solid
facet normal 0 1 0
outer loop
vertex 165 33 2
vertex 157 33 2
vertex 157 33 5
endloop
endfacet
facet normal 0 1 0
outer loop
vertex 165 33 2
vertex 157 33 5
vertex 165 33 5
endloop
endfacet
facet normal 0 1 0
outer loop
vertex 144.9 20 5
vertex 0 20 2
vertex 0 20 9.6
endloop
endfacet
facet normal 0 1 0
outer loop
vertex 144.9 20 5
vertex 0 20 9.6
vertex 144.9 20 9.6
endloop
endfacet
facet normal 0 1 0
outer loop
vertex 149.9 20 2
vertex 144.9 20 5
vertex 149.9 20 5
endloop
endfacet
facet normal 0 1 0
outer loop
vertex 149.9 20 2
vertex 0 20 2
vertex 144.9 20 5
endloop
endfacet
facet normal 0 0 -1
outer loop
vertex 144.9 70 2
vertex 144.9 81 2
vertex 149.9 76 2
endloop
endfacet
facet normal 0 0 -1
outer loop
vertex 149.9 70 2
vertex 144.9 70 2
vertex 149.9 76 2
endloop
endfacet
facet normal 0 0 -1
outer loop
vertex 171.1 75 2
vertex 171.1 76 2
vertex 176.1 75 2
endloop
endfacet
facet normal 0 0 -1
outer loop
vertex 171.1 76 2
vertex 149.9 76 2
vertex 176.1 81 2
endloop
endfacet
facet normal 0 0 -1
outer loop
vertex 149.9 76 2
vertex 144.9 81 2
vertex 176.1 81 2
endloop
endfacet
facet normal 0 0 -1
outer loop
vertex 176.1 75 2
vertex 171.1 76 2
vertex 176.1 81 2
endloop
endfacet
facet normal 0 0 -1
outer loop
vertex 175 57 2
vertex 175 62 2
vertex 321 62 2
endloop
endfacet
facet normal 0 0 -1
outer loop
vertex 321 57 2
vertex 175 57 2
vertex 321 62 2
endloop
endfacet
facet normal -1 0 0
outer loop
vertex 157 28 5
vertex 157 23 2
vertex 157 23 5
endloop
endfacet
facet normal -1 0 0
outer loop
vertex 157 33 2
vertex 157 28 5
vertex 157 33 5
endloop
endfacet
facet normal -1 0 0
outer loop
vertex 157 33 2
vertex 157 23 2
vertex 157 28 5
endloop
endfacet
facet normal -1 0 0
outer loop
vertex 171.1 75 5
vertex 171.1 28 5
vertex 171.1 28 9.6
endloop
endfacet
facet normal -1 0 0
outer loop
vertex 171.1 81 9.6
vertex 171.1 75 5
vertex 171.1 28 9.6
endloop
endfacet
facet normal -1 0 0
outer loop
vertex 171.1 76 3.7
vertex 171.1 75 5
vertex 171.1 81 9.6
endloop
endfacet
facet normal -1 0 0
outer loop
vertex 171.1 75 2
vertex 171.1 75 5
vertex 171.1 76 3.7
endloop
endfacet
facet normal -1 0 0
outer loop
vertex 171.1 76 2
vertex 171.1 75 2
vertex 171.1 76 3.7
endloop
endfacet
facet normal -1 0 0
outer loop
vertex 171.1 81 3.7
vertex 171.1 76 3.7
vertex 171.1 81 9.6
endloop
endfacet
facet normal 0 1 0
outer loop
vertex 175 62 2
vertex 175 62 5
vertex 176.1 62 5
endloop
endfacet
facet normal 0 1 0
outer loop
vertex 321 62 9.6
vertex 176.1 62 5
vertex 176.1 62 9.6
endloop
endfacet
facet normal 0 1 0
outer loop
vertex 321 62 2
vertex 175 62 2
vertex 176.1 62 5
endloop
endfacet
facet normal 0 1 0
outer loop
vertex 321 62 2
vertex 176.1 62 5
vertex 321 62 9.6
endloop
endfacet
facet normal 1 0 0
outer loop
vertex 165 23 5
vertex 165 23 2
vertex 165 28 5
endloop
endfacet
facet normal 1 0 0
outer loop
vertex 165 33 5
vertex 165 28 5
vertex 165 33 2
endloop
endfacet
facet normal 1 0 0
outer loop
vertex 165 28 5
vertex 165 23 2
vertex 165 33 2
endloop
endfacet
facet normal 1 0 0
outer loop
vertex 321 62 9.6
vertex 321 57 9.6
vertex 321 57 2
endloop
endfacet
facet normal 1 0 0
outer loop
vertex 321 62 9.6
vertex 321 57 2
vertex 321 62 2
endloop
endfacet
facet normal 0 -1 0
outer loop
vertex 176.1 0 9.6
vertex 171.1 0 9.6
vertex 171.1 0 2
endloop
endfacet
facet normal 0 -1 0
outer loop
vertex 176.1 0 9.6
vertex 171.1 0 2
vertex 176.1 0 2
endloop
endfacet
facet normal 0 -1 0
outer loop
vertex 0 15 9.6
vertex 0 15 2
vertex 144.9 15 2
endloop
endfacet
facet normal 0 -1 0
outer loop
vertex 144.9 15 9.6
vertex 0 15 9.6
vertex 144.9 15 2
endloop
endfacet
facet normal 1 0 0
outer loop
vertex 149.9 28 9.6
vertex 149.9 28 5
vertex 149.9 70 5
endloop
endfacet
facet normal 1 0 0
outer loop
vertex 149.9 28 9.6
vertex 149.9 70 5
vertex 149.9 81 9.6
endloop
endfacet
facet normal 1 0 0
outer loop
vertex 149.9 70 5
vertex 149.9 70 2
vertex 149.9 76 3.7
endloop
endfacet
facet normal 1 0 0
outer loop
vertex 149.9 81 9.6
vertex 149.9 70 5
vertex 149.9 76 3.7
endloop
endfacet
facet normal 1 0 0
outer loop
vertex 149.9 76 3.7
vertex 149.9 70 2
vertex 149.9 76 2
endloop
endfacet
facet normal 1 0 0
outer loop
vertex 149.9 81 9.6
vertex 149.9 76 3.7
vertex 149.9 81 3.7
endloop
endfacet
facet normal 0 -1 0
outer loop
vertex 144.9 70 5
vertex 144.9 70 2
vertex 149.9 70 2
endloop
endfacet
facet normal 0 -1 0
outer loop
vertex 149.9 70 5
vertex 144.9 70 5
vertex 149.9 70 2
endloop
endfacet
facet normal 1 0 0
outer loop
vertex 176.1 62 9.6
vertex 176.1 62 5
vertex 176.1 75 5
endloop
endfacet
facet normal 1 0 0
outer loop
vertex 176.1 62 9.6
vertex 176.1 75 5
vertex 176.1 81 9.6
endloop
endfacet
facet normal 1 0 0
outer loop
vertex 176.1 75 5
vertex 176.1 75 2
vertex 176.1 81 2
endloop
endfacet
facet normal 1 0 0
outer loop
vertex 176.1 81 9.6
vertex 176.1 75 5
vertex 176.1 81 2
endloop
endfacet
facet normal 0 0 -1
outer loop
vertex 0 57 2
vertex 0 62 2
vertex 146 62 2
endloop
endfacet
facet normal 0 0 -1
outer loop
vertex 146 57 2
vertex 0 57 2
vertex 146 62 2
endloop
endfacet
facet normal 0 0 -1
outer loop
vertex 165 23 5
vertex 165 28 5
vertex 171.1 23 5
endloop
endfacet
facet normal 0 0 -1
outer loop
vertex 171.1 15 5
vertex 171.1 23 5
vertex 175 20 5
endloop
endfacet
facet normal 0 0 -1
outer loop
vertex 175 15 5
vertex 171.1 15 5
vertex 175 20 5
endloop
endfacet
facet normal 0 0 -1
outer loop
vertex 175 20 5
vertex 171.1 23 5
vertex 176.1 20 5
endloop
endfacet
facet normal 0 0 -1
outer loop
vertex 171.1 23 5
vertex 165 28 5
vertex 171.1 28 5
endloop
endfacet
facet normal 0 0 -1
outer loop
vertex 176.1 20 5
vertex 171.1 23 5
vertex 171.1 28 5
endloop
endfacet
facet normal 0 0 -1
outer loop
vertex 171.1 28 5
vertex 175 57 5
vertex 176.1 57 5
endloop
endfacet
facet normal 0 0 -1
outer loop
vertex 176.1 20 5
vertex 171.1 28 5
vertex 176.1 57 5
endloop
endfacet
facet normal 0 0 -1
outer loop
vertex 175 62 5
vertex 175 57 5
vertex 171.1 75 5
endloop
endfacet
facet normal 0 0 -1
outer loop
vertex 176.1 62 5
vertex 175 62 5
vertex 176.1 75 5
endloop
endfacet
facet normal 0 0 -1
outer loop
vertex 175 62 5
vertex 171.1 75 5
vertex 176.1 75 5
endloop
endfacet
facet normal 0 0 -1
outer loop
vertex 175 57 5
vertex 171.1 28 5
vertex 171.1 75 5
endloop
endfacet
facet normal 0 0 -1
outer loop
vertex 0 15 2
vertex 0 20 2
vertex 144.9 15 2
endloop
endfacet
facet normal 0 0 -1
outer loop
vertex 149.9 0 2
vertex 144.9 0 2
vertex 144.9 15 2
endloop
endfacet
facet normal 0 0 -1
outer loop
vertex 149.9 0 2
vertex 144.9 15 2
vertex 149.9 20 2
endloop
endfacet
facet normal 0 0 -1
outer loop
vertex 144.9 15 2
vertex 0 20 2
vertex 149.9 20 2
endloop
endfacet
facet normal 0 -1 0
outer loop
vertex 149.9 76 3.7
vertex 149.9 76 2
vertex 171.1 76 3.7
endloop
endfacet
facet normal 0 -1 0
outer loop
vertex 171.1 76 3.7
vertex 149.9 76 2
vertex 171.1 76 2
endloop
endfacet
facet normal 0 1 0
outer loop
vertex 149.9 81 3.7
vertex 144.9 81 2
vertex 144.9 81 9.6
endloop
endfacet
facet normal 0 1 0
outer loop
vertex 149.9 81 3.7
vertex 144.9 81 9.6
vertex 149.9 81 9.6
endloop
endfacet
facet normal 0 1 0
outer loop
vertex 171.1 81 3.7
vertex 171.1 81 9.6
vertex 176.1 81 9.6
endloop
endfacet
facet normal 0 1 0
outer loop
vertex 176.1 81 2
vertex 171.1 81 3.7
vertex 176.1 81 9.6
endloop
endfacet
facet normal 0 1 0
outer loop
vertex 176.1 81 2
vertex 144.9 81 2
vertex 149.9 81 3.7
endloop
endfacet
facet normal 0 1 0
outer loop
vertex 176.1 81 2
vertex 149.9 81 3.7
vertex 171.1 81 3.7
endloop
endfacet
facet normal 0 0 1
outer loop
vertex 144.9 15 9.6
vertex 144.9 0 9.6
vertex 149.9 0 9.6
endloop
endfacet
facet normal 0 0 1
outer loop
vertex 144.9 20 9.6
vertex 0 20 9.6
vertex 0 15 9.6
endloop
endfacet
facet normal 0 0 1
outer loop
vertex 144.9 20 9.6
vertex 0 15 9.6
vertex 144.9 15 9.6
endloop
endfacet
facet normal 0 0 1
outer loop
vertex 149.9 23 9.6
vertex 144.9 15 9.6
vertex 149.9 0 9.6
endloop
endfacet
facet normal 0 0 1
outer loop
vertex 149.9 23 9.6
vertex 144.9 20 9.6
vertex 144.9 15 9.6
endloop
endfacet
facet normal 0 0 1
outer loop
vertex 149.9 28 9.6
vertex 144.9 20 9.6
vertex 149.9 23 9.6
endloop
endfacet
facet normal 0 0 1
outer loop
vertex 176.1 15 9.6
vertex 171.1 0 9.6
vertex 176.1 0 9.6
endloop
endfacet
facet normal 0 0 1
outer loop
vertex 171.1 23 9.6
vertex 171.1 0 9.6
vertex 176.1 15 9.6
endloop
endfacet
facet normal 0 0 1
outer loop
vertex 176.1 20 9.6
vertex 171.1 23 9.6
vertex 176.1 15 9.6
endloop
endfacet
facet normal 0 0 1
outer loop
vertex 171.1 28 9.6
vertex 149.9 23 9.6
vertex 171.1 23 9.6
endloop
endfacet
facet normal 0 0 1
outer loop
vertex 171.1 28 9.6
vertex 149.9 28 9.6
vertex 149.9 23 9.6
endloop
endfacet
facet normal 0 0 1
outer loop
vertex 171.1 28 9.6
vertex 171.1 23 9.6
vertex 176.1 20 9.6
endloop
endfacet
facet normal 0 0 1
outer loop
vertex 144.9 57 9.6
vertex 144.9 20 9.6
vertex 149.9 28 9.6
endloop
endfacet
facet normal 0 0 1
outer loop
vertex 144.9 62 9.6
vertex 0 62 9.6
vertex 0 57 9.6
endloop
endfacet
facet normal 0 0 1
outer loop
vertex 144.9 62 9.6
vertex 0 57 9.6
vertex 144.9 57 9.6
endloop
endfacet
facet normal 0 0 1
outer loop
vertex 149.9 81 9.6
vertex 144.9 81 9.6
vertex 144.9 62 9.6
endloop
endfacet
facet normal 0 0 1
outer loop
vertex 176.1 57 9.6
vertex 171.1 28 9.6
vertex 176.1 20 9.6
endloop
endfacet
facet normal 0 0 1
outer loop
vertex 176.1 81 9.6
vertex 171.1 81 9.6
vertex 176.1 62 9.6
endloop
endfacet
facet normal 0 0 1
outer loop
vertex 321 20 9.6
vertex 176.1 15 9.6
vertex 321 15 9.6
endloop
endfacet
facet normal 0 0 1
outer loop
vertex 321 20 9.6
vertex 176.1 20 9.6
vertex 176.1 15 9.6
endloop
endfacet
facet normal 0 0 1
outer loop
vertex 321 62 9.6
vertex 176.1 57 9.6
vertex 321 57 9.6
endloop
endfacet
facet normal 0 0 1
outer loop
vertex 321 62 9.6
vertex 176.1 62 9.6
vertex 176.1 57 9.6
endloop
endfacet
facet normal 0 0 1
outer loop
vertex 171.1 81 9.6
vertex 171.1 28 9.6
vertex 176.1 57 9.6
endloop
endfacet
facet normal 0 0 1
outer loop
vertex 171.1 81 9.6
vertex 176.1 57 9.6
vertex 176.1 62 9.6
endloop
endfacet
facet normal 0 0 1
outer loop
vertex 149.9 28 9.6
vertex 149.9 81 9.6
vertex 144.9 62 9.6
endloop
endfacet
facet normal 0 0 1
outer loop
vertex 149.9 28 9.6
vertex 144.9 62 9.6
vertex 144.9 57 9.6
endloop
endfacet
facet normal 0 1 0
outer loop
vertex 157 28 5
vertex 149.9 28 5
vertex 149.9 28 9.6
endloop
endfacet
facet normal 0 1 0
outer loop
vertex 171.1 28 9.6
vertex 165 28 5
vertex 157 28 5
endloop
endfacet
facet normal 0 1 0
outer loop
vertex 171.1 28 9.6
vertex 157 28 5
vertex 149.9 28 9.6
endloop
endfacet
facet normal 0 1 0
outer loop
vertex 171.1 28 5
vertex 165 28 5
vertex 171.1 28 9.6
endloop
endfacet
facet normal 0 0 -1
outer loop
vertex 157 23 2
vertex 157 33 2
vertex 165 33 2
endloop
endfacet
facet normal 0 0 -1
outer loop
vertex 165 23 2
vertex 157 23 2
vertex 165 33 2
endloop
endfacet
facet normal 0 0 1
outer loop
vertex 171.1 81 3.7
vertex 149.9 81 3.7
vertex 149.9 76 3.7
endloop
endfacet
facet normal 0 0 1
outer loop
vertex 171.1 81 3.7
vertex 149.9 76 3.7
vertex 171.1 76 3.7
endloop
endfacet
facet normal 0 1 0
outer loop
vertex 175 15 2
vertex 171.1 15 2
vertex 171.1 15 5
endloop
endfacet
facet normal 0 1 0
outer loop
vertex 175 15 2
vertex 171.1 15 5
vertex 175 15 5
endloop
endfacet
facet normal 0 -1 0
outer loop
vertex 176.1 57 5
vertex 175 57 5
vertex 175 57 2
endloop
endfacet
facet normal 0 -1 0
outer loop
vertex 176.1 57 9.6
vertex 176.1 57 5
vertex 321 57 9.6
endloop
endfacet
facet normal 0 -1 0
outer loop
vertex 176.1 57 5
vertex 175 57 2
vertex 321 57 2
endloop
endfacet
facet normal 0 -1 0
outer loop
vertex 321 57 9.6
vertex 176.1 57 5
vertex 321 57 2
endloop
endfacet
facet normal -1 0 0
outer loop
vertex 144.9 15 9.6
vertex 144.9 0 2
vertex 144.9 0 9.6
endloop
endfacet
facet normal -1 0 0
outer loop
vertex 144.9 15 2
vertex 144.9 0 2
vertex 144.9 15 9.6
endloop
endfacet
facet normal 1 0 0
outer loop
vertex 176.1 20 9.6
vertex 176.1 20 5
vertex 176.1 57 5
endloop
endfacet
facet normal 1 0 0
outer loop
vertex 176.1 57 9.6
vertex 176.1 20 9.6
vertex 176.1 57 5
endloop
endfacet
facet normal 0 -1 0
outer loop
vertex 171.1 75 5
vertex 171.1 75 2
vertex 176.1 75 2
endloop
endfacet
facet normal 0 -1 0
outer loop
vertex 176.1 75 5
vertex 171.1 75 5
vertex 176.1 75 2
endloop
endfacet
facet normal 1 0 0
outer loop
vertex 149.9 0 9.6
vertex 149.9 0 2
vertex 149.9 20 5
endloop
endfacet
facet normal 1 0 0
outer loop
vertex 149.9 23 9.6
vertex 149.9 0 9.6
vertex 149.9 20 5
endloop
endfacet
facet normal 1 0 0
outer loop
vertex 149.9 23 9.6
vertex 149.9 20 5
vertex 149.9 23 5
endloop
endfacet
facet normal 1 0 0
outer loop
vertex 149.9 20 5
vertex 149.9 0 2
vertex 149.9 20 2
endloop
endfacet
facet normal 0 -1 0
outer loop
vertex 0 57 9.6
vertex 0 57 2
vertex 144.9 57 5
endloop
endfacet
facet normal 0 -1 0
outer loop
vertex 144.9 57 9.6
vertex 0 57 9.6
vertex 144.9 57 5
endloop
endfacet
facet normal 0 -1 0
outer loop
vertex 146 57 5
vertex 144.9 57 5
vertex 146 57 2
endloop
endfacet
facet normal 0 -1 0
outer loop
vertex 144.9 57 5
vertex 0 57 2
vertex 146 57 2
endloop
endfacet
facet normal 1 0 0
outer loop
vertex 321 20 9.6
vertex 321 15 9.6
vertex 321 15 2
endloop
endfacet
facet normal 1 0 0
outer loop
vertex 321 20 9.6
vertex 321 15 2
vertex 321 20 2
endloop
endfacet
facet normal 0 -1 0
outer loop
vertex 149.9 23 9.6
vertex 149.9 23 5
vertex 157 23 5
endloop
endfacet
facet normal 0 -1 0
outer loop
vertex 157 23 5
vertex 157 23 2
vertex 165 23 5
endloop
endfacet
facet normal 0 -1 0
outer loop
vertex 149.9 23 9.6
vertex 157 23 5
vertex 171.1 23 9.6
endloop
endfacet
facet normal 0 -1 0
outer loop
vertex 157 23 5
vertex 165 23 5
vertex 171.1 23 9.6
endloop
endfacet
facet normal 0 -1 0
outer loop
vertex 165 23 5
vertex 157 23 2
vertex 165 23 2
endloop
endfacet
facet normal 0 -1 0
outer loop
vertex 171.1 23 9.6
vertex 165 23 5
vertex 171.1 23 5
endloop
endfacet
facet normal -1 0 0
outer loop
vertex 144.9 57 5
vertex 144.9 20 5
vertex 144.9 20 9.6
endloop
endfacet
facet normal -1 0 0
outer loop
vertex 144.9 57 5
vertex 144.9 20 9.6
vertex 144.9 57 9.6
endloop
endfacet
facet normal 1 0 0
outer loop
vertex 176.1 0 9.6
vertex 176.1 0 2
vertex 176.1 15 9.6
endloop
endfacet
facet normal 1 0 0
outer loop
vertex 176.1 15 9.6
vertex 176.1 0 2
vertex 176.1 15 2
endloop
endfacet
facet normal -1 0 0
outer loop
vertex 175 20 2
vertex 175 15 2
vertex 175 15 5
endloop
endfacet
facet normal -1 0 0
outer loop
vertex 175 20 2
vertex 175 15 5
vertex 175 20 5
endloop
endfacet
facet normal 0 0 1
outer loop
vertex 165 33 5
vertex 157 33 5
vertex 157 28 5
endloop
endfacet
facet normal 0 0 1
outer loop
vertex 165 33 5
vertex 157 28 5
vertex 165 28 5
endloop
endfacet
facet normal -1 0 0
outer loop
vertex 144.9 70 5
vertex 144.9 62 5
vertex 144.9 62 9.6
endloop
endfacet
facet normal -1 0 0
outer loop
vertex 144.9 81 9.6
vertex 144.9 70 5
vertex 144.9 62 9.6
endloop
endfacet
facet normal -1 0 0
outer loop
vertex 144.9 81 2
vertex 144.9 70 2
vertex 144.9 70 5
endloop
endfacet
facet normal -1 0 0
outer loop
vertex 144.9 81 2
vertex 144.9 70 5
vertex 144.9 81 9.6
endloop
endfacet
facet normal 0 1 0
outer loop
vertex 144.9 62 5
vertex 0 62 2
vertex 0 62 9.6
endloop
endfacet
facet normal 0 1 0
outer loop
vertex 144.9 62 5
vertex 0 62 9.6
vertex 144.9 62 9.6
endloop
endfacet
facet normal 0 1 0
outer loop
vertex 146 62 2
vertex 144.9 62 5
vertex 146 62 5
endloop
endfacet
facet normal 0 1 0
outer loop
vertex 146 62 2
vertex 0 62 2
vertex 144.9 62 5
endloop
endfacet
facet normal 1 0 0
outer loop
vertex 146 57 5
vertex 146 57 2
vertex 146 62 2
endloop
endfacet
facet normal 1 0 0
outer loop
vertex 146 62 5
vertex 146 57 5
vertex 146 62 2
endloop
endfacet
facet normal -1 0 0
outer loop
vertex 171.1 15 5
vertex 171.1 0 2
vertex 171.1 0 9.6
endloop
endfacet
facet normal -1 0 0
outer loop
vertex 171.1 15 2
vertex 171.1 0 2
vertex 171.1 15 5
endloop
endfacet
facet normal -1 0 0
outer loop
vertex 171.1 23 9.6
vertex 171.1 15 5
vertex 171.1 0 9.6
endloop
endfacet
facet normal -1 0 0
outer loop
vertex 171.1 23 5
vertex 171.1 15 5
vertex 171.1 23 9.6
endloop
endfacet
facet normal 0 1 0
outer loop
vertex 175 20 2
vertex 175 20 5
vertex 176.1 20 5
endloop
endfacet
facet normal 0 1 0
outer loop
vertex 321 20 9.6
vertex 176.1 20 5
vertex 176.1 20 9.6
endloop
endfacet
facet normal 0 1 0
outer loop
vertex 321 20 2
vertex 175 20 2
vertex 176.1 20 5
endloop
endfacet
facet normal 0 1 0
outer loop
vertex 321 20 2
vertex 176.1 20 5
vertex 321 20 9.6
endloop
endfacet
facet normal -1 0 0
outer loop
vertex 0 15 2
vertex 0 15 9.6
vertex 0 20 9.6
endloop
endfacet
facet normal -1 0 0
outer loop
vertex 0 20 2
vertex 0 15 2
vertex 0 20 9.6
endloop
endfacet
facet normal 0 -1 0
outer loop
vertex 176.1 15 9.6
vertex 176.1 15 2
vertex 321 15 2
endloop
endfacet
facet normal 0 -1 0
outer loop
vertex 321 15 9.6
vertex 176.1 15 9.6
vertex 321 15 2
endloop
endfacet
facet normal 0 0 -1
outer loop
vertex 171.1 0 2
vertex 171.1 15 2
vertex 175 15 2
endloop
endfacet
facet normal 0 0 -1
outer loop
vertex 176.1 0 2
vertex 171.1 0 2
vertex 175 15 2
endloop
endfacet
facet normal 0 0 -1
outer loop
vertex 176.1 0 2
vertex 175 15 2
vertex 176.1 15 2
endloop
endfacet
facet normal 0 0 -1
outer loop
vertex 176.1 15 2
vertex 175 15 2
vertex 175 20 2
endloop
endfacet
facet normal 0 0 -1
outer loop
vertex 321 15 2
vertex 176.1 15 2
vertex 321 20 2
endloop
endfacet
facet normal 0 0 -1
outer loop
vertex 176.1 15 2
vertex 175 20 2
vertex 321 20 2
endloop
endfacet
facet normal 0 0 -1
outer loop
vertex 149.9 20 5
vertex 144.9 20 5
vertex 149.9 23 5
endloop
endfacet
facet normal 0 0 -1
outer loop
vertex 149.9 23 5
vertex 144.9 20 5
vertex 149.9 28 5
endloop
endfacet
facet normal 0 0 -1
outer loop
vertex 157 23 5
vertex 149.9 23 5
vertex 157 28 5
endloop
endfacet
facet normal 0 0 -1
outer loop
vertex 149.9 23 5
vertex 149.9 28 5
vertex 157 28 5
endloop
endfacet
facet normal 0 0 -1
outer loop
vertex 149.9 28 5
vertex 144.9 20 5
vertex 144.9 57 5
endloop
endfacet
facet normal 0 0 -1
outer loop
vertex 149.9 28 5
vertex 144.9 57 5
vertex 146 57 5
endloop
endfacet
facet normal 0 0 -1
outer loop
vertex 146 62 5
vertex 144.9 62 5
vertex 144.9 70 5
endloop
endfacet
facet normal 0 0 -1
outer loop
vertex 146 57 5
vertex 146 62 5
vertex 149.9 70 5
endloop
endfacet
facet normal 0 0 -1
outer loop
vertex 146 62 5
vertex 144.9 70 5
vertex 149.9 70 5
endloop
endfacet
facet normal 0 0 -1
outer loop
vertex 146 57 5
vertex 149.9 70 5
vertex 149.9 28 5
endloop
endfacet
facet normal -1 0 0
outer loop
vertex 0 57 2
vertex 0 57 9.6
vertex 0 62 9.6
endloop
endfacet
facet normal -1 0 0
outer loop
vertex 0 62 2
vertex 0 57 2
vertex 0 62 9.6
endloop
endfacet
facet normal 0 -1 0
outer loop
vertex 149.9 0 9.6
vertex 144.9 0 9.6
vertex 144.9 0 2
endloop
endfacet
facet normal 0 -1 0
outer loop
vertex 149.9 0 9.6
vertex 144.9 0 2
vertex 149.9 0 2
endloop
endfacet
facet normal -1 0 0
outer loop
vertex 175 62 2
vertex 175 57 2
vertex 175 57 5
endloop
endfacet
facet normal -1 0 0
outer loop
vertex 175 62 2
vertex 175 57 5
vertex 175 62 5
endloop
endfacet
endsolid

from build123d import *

# Parameters (mm, degrees)
BOX012_W     = 8
BOX012_H     = 10
BOX012_DEPTH = 3
BOX013_W     = 146
BOX013_H     = 5
BOX013_DEPTH = 7.6
BOX014_W     = 146
BOX014_H     = 5
BOX014_DEPTH = 7.6
BOX015_W     = 146
BOX015_H     = 5
BOX015_DEPTH = 7.6
BOX016_W     = 146
BOX016_H     = 5
BOX016_DEPTH = 7.6
BOX009_W     = 5
BOX009_H     = 50
BOX009_DEPTH = 3
BOX010_W     = 5
BOX010_H     = 60
BOX010_DEPTH = 3
BOX011_W     = 22
BOX011_H     = 5
BOX011_DEPTH = 3
BOX006_W     = 5
BOX006_H     = 81
BOX006_DEPTH = 7.6
BOX007_W     = 22
BOX007_H     = 5
BOX007_DEPTH = 7.6
BOX008_W     = 22
BOX008_H     = 5
BOX008_DEPTH = 1.7
BOX005_W     = 5
BOX005_H     = 81
BOX005_DEPTH = 7.6


with BuildPart() as cube011:
    # Box012 → Box012 (new body)
    with BuildSketch(Plane(origin=(157, 23, 2), x_dir=(1, 0, 0), z_dir=(0, 0, 1))):
        with Locations((4, 5)):
            Rectangle(BOX012_W, BOX012_H)
    extrude(amount=BOX012_DEPTH)


with BuildPart() as cube012:
    # Box013 → Box013 (new body)
    with BuildSketch(Plane(origin=(0, 15, 2), x_dir=(1, 0, 0), z_dir=(0, 0, 1))):
        with Locations((73, 2.5)):
            Rectangle(BOX013_W, BOX013_H)
    extrude(amount=BOX013_DEPTH)


with BuildPart() as cube013:
    # Box014 → Box014 (new body)
    with BuildSketch(Plane(origin=(0, 57, 2), x_dir=(1, 0, 0), z_dir=(0, 0, 1))):
        with Locations((73, 2.5)):
            Rectangle(BOX014_W, BOX014_H)
    extrude(amount=BOX014_DEPTH)


with BuildPart() as cube014:
    # Box015 → Box015 (new body)
    with BuildSketch(Plane(origin=(175, 57, 2), x_dir=(1, 0, 0), z_dir=(0, 0, 1))):
        with Locations((73, 2.5)):
            Rectangle(BOX015_W, BOX015_H)
    extrude(amount=BOX015_DEPTH)


with BuildPart() as cube015:
    # Box016 → Box016 (new body)
    with BuildSketch(Plane(origin=(175, 15, 2), x_dir=(1, 0, 0), z_dir=(0, 0, 1))):
        with Locations((73, 2.5)):
            Rectangle(BOX016_W, BOX016_H)
    extrude(amount=BOX016_DEPTH)


with BuildPart() as cube008:
    # Box009 → Box009 (new body)
    with BuildSketch(Plane(origin=(134.4, 20, 2), x_dir=(1, 0, 0), z_dir=(0, 0, 1))):
        with Locations((2.5, 25)):
            Rectangle(BOX009_W, BOX009_H)
    extrude(amount=BOX009_DEPTH)


with BuildPart() as cube009:
    # Box010 → Box010 (new body)
    with BuildSketch(Plane(origin=(160.6, 15, 2), x_dir=(1, 0, 0), z_dir=(0, 0, 1))):
        with Locations((2.5, 30)):
            Rectangle(BOX010_W, BOX010_H)
    extrude(amount=BOX010_DEPTH)


with BuildPart() as cube010:
    # Box011 → Box011 (new body)
    with BuildSketch(Plane(origin=(139, 23, 2), x_dir=(1, 0, 0), z_dir=(0, 0, 1))):
        with Locations((11, 2.5)):
            Rectangle(BOX011_W, BOX011_H)
    extrude(amount=BOX011_DEPTH)


with BuildPart() as cube005:
    # Box006 → Box006 (new body)
    with BuildSketch(Plane(origin=(160.6, 0, 2), x_dir=(1, 0, 0), z_dir=(0, 0, 1))):
        with Locations((2.5, 40.5)):
            Rectangle(BOX006_W, BOX006_H)
    extrude(amount=BOX006_DEPTH)


with BuildPart() as cube006:
    # Box007 → Box007 (new body)
    with BuildSketch(Plane(origin=(139, 23, 2), x_dir=(1, 0, 0), z_dir=(0, 0, 1))):
        with Locations((11, 2.5)):
            Rectangle(BOX007_W, BOX007_H)
    extrude(amount=BOX007_DEPTH)


with BuildPart() as cube007:
    # Box008 → Box008 (new body)
    with BuildSketch(Plane(origin=(139, 76, 2), x_dir=(1, 0, 0), z_dir=(0, 0, 1))):
        with Locations((11, 2.5)):
            Rectangle(BOX008_W, BOX008_H)
    extrude(amount=BOX008_DEPTH)


with BuildPart() as holder:
    # Box005 → Box005 (new body)
    with BuildSketch(Plane(origin=(134.4, 0, 2), x_dir=(1, 0, 0), z_dir=(0, 0, 1))):
        with Locations((2.5, 40.5)):
            Rectangle(BOX005_W, BOX005_H)
    extrude(amount=BOX005_DEPTH)

    # Fusion003: union Cube005, Cube006, Cube007
    add(cube005.part)
    add(cube006.part)
    add(cube007.part)

    # Cut009: cut Cube010
    add(cube010.part, mode=Mode.SUBTRACT)

    # Cut010: cut Cube009
    add(cube009.part, mode=Mode.SUBTRACT)

    # Cut011: cut Cube008
    add(cube008.part, mode=Mode.SUBTRACT)


with BuildPart() as holder_1:
    # Cut011 placement: moved
    add(holder.part.moved(Location((10.5, 0, 0))))

    # Fusion004: union Cube011, Cube012, Cube013, Cube014, Cube015
    add(cube011.part)
    add(cube012.part)
    add(cube013.part)
    add(cube014.part)
    add(cube015.part)


solid = holder_1.part
